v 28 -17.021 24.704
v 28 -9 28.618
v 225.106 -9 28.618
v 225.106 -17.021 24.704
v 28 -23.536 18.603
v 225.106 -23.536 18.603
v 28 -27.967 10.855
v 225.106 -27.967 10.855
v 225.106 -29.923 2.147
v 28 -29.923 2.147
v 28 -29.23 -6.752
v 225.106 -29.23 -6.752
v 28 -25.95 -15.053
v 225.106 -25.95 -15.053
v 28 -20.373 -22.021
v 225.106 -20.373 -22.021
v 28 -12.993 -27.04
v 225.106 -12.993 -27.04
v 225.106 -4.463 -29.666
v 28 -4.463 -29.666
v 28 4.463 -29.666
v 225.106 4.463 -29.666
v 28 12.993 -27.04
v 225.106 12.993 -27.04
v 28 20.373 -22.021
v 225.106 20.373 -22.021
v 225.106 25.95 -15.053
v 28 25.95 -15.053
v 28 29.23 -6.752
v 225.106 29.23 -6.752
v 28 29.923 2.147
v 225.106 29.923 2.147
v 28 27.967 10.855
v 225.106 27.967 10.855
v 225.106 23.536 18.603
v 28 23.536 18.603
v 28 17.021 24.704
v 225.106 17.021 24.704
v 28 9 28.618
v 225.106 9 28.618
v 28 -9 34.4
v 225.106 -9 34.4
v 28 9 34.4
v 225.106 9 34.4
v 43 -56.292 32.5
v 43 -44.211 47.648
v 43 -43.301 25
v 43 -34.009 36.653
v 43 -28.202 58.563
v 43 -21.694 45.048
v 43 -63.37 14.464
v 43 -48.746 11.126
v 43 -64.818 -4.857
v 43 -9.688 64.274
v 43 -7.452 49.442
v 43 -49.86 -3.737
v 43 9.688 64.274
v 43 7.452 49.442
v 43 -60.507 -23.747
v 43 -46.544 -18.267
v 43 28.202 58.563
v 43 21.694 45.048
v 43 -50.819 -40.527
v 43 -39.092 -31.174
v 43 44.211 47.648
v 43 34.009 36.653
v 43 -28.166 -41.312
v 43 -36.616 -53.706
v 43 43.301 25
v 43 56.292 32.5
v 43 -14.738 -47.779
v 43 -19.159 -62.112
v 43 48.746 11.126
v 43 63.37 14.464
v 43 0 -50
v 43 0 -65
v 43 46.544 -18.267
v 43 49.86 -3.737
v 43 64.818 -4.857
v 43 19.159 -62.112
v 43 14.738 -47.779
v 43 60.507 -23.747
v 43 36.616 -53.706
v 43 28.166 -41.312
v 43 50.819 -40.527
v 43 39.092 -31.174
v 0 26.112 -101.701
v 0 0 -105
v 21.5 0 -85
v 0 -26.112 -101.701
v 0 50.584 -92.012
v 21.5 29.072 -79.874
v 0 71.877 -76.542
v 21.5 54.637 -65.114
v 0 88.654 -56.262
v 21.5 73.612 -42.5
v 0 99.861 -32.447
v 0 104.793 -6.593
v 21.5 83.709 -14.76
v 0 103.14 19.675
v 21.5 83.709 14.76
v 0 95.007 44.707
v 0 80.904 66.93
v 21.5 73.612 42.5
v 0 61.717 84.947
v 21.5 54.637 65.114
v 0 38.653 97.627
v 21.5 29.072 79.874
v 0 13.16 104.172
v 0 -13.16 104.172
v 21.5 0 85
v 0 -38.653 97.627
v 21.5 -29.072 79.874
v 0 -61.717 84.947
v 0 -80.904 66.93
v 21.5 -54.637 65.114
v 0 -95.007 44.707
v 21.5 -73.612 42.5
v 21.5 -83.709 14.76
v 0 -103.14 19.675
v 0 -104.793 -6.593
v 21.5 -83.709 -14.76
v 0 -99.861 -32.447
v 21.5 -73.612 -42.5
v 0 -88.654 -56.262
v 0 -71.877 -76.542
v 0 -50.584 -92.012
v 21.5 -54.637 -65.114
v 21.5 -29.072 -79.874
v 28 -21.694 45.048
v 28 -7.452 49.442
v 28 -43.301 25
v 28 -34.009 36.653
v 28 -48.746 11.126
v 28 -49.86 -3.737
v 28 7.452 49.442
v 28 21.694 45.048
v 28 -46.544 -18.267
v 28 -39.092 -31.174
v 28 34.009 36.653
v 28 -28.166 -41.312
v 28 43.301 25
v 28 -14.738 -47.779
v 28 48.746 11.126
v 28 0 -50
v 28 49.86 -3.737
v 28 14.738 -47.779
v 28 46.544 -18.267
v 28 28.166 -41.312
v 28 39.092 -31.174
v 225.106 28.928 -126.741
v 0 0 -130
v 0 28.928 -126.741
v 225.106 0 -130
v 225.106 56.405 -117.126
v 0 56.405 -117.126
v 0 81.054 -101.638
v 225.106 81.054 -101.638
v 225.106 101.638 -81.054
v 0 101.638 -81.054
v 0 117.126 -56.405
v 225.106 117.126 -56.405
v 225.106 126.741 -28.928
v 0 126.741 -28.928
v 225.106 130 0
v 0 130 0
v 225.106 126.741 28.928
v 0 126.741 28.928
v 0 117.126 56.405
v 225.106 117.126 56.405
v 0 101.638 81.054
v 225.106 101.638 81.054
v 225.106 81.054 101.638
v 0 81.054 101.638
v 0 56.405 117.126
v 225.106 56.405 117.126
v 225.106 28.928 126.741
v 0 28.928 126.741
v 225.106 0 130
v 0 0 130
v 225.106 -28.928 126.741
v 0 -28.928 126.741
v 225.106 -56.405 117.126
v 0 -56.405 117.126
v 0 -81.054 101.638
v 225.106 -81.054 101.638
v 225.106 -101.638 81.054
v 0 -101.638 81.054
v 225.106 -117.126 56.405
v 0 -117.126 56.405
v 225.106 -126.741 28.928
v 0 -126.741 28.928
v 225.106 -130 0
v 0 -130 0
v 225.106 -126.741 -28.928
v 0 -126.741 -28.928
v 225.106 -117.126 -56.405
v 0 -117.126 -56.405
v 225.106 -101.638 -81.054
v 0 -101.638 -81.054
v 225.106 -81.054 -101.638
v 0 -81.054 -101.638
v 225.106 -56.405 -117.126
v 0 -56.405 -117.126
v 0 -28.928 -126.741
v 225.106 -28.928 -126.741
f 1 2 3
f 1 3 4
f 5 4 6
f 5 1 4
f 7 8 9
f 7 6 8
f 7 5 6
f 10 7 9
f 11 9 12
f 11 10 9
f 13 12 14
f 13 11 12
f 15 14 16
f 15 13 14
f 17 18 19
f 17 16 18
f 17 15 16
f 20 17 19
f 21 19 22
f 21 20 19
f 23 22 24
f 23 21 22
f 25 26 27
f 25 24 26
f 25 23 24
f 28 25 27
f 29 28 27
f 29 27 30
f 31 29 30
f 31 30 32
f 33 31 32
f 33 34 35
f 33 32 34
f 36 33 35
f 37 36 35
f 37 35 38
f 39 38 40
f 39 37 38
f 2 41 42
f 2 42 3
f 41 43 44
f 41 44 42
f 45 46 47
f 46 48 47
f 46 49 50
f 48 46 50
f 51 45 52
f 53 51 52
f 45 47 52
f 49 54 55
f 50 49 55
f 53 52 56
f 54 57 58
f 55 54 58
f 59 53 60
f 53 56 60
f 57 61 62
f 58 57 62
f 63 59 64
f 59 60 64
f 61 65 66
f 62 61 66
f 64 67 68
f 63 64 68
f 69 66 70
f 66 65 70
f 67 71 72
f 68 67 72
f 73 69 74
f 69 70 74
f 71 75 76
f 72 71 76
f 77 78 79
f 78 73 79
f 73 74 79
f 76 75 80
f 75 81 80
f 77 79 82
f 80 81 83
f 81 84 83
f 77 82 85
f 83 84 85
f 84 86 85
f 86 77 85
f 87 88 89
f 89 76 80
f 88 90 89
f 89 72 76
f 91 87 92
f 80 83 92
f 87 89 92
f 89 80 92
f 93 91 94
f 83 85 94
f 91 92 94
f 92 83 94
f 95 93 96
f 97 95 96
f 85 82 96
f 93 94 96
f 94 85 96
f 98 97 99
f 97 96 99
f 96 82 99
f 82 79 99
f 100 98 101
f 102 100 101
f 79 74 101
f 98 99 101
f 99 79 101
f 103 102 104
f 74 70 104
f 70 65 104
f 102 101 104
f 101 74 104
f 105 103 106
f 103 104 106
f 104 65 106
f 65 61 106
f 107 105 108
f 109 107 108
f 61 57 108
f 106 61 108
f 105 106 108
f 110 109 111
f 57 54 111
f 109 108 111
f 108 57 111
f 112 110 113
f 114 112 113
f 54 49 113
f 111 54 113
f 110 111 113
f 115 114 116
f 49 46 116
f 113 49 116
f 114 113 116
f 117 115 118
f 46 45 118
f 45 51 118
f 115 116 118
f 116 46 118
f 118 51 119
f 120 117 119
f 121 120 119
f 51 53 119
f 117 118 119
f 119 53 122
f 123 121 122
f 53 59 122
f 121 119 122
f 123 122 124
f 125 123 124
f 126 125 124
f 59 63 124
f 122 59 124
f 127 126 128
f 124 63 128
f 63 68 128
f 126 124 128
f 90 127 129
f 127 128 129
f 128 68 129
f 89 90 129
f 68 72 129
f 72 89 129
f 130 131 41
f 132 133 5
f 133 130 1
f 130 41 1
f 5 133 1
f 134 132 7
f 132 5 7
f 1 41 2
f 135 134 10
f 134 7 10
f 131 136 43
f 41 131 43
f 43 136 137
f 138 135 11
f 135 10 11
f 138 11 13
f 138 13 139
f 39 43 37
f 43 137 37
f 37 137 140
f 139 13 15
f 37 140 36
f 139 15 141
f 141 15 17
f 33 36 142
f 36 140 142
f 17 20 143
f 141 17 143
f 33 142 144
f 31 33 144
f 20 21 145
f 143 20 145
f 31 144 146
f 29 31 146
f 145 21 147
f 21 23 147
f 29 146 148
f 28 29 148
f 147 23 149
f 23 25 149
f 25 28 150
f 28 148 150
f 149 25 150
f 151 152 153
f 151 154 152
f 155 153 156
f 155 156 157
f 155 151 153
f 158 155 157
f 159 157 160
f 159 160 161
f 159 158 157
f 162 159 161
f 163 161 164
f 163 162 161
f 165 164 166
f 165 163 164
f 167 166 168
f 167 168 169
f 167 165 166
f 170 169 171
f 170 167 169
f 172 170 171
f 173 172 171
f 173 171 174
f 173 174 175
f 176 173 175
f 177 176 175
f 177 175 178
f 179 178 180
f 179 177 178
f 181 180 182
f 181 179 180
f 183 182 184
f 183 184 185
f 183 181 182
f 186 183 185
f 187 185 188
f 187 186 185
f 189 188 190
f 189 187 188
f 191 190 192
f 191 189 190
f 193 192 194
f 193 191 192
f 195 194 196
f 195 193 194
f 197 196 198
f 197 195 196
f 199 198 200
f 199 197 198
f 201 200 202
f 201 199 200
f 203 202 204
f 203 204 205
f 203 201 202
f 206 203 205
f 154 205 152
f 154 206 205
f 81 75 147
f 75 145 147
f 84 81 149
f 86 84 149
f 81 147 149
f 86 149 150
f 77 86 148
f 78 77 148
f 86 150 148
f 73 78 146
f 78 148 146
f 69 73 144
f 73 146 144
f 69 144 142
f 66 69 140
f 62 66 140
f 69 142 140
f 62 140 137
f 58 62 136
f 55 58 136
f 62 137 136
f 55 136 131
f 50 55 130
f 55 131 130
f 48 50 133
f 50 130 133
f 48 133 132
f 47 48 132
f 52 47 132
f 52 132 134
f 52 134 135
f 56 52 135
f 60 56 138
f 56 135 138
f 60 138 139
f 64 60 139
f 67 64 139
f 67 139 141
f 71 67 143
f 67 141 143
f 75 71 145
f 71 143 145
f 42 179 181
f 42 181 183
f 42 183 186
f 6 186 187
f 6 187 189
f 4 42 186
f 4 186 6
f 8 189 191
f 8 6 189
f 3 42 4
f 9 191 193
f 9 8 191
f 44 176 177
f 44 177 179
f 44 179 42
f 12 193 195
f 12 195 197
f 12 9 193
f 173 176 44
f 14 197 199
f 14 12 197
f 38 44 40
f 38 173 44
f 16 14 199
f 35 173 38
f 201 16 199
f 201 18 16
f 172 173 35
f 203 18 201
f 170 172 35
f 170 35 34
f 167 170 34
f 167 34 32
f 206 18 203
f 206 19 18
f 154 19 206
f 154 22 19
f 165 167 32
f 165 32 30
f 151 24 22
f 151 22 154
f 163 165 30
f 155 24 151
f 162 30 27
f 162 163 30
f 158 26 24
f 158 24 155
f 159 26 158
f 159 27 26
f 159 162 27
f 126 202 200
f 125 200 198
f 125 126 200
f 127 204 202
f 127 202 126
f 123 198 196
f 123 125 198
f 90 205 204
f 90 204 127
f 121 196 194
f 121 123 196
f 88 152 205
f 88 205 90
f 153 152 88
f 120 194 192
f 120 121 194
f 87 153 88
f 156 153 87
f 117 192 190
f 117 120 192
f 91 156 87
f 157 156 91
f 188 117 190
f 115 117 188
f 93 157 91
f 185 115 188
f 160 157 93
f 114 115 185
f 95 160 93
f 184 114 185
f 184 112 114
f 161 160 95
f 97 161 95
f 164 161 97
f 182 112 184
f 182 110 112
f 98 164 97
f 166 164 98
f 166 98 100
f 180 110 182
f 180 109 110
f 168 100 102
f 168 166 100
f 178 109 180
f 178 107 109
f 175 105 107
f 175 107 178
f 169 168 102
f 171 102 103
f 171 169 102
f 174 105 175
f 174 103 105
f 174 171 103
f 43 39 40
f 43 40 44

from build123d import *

# Parameters (mm, degrees)
F5_DEPTH = 225.107391404


with BuildPart() as f1:
    # F0 (on Front) → F1 (revolve)
    with BuildSketch(Plane.XZ):
        Polygon((28, 0), (0, 0), (0, -130), (225.106391404, -130), (225.106391404, 0), align=None)
    revolve(axis=Axis((88.4175841547, 0, 0), (1, 0, 0)))

    # F2 (on Front) → F3 (revolve, cut)
    with BuildSketch(Plane.XZ):
        Polygon((28, 0), (0, 0), (0, -105), (43, -65), (43, -50), (28, -50), align=None)
    revolve(axis=Axis((88.4175841547, 0, 0), (1, 0, 0)), mode=Mode.SUBTRACT)

    # F4 (on Right) → F5 (cut, through all)
    with BuildSketch(Plane.YZ):
        with BuildLine():
            Line((0, 30), (0, 24.4))
            Line((0, 24.4), (9, 24.4))
            Line((9, 24.4), (9, 28.6181760425))
            ThreePointArc((9, 28.6181760425), (4.5527309785, 29.6525317745), (0, 30))
        make_face()
        with BuildLine():
            ThreePointArc((0, 30), (-4.5527309785, 29.6525317745), (-9, 28.6181760425))
            Line((-9, 28.6181760425), (-9, 24.4))
            Line((-9, 24.4), (0, 24.4))
            Line((0, 24.4), (0, 30))
        make_face()
        with BuildLine():
            ThreePointArc((-9, 28.6181760425), (-29.6525317745, -4.5527309785), (0, -30))
            Line((0, -30), (0, 24.4))
            Line((0, 24.4), (-9, 24.4))
            Line((-9, 24.4), (-9, 28.6181760425))
        make_face()
        with BuildLine():
            Line((0, 24.4), (0, -30))
            ThreePointArc((0, -30), (21.2132034356, -21.2132034356), (30, 0))
            ThreePointArc((30, 0), (24.1867732449, 17.7482393493), (9, 28.6181760425))
            Line((9, 28.6181760425), (9, 24.4))
            Line((9, 24.4), (0, 24.4))
        make_face()
        with BuildLine():
            Line((-9, 34.4), (-9, 28.6181760425))
            ThreePointArc((-9, 28.6181760425), (-4.5527309785, 29.6525317745), (0, 30))
            Line((0, 30), (0, 34.4))
            Line((0, 34.4), (-9, 34.4))
        make_face()
        with BuildLine():
            ThreePointArc((0, 30), (4.5527309785, 29.6525317745), (9, 28.6181760425))
            Line((9, 28.6181760425), (9, 34.4))
            Line((9, 34.4), (0, 34.4))
            Line((0, 34.4), (0, 30))
        make_face()
    extrude(amount=F5_DEPTH, mode=Mode.SUBTRACT)


solid = f1.part
